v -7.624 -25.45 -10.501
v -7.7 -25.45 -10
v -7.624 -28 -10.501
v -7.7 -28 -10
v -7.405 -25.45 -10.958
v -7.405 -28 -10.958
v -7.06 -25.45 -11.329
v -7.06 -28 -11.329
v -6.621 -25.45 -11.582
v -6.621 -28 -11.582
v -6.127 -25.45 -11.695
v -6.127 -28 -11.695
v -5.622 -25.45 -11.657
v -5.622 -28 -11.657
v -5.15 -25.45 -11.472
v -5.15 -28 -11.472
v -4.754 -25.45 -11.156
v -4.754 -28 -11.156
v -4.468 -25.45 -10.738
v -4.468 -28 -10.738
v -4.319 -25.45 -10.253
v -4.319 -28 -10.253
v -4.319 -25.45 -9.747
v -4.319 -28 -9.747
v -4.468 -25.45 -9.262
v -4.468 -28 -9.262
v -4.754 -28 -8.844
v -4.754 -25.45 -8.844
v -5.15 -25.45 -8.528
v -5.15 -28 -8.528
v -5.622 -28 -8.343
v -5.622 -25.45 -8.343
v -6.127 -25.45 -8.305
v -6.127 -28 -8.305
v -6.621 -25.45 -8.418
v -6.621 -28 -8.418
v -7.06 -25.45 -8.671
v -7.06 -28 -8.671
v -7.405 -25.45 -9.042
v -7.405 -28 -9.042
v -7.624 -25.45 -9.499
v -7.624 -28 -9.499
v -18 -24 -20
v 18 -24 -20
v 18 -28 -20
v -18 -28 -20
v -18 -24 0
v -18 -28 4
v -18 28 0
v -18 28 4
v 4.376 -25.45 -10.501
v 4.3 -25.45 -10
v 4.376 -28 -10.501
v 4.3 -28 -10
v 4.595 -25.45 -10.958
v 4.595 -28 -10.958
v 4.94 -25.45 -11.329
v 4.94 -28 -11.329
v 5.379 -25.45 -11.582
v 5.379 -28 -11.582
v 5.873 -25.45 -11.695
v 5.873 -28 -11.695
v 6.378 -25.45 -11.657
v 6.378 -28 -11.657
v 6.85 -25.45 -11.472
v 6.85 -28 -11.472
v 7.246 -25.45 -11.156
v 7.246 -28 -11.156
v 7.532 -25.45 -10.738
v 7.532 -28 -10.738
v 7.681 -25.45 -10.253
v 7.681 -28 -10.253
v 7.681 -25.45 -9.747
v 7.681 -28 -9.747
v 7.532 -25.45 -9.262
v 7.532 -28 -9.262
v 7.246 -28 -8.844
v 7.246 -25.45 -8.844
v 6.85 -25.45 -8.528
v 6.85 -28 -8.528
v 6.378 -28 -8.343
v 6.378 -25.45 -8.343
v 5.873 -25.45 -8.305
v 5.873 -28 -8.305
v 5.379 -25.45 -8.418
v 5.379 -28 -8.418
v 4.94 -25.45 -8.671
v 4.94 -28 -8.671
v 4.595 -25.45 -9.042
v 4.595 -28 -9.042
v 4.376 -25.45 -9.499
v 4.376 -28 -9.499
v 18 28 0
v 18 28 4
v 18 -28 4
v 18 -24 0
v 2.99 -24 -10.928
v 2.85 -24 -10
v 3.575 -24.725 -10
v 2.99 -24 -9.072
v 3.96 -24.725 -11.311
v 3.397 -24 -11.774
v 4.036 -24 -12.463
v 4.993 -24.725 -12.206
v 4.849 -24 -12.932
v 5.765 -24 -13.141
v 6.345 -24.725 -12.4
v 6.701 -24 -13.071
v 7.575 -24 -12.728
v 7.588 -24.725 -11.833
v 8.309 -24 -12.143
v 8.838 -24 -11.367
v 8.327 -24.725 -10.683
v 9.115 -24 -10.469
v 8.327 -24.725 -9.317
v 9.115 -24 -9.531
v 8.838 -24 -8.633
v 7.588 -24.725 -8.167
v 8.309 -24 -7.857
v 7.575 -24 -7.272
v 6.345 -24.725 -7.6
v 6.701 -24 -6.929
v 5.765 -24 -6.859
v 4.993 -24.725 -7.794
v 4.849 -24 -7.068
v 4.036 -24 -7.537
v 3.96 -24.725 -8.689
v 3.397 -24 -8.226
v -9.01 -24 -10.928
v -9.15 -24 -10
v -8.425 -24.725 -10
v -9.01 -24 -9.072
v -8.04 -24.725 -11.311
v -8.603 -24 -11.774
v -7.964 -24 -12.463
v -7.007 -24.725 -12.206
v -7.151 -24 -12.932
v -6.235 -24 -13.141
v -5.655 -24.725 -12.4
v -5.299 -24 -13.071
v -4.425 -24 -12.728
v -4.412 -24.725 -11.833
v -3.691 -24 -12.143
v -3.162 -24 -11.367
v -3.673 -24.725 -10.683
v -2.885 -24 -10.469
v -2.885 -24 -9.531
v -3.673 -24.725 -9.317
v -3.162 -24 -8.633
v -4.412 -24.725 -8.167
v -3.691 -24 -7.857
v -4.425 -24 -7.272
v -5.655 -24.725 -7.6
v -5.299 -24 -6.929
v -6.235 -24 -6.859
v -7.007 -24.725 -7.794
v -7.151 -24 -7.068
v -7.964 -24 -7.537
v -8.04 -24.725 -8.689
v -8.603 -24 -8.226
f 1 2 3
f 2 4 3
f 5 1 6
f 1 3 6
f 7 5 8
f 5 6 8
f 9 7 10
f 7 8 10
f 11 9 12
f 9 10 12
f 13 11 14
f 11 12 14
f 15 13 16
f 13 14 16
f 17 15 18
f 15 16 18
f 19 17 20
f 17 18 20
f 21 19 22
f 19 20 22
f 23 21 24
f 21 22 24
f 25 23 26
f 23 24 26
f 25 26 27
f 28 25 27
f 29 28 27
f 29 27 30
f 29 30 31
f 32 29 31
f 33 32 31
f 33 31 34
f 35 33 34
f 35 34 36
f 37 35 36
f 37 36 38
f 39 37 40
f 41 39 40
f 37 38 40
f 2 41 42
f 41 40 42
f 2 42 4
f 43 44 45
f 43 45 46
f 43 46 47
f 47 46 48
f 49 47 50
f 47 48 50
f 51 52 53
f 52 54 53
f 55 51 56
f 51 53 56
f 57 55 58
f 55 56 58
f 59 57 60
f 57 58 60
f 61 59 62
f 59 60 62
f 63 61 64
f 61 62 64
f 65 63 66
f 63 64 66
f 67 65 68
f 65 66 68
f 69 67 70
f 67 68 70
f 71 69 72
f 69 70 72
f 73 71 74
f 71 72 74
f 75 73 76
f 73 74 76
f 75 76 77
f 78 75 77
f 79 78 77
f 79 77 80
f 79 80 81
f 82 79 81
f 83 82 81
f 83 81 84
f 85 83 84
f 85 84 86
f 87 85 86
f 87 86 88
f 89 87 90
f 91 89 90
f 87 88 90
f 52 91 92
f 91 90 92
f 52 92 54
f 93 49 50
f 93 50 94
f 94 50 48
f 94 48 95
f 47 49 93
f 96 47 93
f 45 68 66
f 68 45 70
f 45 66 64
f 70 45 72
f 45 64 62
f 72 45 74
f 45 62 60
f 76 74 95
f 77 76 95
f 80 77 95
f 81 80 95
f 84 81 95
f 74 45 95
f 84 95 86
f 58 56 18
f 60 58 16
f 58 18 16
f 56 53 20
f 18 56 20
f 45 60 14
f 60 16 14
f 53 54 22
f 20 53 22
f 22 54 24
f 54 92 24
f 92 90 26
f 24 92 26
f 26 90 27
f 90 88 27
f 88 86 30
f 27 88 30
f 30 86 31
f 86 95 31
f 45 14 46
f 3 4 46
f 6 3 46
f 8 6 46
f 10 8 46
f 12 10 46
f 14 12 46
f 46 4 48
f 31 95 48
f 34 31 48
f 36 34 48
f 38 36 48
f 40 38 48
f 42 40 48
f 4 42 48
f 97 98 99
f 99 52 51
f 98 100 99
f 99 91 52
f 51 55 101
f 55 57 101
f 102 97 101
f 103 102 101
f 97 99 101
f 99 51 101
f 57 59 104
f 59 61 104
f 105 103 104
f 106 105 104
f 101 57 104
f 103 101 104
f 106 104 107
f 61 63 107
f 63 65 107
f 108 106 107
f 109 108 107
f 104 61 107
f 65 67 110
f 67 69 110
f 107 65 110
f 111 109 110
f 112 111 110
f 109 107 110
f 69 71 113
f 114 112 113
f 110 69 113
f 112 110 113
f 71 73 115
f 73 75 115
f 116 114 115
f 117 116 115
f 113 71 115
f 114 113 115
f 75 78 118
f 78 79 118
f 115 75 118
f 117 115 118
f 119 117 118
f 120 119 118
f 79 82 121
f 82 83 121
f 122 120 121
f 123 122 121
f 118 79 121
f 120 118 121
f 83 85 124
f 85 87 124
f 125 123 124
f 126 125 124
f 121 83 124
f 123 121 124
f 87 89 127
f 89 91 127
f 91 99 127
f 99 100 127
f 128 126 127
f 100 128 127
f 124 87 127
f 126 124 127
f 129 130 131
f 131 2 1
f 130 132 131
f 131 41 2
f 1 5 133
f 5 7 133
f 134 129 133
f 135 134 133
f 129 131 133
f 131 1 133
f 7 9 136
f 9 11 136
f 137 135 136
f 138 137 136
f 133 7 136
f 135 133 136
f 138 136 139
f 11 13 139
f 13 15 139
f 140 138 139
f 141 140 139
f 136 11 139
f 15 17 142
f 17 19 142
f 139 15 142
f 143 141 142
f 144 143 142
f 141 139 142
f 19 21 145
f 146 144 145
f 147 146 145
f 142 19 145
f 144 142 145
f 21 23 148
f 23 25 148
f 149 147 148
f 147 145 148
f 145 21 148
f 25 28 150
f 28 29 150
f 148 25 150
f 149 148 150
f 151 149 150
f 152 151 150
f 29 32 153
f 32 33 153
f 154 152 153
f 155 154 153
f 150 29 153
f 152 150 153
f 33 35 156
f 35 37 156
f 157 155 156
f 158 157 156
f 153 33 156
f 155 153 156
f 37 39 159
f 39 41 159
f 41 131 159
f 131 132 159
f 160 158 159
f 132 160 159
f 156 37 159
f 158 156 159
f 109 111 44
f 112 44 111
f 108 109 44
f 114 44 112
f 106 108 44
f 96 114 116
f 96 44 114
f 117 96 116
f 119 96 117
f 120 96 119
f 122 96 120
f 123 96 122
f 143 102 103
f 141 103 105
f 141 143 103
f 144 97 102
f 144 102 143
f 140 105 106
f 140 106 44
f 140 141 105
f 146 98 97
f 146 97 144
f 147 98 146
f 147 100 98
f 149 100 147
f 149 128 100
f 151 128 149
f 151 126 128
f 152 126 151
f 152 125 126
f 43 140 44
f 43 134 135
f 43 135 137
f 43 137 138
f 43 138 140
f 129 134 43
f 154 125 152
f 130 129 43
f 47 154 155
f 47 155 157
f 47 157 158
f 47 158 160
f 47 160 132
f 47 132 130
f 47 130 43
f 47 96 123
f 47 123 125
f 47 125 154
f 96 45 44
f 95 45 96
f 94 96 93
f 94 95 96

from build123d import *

# Parameters (mm, degrees)
SKETCH1_W                                           = 36
SKETCH1_H                                           = 56
BOSS_EXTRUDE1_DEPTH                                 = 4
SKETCH2_W                                           = 36
SKETCH2_H                                           = 4
BOSS_EXTRUDE2_DEPTH                                 = 20
CSK_FOR_M3_COUNTERSUNK_FLAT_HEAD_SCREW1_D           = 3.4
CSK_FOR_M3_COUNTERSUNK_FLAT_HEAD_SCREW1_CSINK_D     = 6.3
CSK_FOR_M3_COUNTERSUNK_FLAT_HEAD_SCREW1_CSINK_ANGLE = 90


with BuildPart() as part:
    # Sketch1 → Boss-Extrude1 (new body)
    with BuildSketch(Plane.XY):
        Rectangle(SKETCH1_W, SKETCH1_H)
    extrude(amount=BOSS_EXTRUDE1_DEPTH)

    # Sketch2 → Boss-Extrude2 (add)
    with BuildSketch(Plane(origin=(0, 0, 0), x_dir=(-1, 0, 0), z_dir=(0, 0, -1))):
        with Locations((0, -26)):
            Rectangle(SKETCH2_W, SKETCH2_H)
    extrude(amount=BOSS_EXTRUDE2_DEPTH)

    # CSK for M3 Countersunk Flat Head Screw1 (through all)
    with Locations(Plane(origin=(0, -24, 0), x_dir=(1, 0, 0), z_dir=(0, 1, 0))):
        with Locations((6, 10), (-6, 10)):
            CounterSinkHole(CSK_FOR_M3_COUNTERSUNK_FLAT_HEAD_SCREW1_D / 2, CSK_FOR_M3_COUNTERSUNK_FLAT_HEAD_SCREW1_CSINK_D / 2, counter_sink_angle=CSK_FOR_M3_COUNTERSUNK_FLAT_HEAD_SCREW1_CSINK_ANGLE)


solid = part.part
